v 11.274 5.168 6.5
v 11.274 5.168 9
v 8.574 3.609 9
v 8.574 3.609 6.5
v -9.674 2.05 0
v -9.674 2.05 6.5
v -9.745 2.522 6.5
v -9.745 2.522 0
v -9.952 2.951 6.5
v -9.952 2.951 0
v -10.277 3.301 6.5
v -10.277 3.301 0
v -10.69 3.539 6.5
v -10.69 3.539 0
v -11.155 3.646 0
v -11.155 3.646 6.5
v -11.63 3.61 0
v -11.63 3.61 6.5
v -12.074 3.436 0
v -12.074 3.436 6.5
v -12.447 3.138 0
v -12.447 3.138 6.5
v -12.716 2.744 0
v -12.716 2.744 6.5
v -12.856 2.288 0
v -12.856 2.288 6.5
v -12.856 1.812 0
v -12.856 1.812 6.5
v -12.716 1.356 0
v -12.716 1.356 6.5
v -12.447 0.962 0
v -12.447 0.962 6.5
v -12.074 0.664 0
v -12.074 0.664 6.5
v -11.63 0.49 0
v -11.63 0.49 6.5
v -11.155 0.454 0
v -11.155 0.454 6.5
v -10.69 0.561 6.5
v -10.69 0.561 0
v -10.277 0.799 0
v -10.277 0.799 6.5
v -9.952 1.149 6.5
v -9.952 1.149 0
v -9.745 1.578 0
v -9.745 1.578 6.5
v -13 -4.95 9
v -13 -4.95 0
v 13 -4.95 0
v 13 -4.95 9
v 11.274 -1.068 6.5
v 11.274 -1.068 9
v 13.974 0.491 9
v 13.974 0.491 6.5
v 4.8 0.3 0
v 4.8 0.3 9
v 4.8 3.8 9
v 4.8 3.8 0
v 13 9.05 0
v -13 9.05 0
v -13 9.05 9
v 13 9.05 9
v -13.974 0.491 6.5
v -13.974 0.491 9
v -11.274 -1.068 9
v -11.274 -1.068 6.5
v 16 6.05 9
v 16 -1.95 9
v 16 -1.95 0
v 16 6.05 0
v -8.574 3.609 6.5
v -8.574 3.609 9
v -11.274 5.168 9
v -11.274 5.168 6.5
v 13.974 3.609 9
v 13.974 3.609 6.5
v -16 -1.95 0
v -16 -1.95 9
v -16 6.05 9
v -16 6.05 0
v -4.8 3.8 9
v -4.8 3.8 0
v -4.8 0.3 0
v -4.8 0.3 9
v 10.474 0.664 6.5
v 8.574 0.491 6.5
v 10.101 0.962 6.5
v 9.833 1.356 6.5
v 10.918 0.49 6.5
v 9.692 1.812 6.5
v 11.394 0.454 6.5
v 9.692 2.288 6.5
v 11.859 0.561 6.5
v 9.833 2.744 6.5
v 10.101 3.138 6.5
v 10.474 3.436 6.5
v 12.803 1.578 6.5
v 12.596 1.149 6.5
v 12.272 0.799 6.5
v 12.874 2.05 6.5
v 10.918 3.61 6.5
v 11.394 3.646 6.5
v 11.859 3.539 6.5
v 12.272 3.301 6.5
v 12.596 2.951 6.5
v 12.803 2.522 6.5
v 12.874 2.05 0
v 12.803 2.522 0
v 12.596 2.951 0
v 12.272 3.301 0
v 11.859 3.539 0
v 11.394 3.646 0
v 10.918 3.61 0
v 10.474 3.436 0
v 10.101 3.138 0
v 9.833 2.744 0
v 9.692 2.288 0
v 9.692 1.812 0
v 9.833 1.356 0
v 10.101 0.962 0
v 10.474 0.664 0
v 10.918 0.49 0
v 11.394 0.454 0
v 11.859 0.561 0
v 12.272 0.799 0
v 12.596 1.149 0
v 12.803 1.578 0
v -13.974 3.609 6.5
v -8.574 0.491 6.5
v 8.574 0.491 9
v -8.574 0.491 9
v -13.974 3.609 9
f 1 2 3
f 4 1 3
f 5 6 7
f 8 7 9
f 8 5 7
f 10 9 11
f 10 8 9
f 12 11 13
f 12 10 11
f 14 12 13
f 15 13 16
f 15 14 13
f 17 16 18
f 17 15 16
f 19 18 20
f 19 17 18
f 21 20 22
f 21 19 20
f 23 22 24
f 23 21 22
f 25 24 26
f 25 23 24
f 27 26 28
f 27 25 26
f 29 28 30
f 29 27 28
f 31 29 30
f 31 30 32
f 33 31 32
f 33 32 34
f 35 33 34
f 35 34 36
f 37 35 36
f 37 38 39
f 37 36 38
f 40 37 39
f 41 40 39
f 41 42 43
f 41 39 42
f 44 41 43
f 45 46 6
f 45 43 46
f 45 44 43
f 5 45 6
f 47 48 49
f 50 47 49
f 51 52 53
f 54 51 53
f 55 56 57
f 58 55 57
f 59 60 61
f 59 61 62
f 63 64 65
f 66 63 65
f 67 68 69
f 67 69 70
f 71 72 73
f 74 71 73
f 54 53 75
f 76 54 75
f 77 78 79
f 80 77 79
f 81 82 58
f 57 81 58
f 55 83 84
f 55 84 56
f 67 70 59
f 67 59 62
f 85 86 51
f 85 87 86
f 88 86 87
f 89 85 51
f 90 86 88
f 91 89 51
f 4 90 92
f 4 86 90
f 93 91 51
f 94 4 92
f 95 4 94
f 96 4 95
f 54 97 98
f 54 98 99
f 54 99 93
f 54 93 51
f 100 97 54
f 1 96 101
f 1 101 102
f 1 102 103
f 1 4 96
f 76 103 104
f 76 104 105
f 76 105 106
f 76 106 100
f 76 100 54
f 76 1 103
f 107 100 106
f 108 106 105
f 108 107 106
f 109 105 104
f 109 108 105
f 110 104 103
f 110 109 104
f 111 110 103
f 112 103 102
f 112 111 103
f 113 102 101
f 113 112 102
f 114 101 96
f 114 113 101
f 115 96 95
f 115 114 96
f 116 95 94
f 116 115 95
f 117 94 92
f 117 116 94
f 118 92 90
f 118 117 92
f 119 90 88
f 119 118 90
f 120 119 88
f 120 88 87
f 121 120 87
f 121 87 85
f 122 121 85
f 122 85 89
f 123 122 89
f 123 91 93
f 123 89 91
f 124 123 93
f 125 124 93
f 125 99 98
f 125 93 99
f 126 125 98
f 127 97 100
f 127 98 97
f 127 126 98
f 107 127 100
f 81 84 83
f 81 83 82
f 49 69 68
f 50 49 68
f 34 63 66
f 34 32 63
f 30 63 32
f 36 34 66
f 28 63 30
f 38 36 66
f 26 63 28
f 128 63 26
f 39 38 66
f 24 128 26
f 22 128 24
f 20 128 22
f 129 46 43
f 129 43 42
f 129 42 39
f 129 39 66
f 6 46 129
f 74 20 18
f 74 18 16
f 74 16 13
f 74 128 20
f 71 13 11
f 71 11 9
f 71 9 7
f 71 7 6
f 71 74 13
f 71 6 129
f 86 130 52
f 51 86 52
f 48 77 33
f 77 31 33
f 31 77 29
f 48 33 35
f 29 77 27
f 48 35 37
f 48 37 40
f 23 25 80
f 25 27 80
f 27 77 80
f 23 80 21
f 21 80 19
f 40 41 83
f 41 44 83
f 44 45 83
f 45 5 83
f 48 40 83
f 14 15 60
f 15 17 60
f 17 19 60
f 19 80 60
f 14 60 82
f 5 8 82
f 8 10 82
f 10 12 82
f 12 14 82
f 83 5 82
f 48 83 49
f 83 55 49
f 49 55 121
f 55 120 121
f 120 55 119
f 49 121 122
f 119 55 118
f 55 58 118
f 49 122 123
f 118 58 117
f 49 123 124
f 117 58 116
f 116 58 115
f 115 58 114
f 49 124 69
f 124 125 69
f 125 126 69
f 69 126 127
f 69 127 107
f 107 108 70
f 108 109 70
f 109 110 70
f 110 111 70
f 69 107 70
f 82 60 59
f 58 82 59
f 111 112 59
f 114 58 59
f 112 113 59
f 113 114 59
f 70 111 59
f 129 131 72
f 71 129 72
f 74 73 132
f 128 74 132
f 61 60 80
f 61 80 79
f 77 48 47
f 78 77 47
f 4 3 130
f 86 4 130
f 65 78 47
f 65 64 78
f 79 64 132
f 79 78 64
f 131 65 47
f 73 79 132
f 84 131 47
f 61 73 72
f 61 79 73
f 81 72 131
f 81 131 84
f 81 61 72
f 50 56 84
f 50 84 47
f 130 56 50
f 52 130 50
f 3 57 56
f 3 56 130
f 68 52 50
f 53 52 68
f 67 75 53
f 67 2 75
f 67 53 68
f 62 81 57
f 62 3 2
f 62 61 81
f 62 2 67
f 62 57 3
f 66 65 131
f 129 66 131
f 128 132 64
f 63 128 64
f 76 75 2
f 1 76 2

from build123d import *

# Parameters (mm, degrees)
F0_W     = 32
F0_H     = 14
F0_R     = 1.6
F0_W_2   = 9.6
F0_H_2   = 3.5
F1_DEPTH = 9
F2_SIZE  = 3
F4_DEPTH = 2.5


with BuildPart() as f1:
    # F0 (on Top) → F1 (new body)
    with BuildSketch(Plane.XY):
        with Locations((0, 2.05)):
            Rectangle(F0_W, F0_H)
        with Locations((-11.274233, 2.05)):
            Circle(F0_R, mode=Mode.SUBTRACT)
        with Locations((0, 2.05)):
            Rectangle(F0_W_2, F0_H_2, mode=Mode.SUBTRACT)
        with Locations((11.274233, 2.05)):
            Circle(F0_R, mode=Mode.SUBTRACT)
    extrude(amount=F1_DEPTH)

    # F2
    f2_edges = [f1.edges().sort_by_distance(p)[0] for p in [
        (-16, -4.95, 4.5),
        (16, -4.95, 4.5),
        (16, 9.05, 4.5),
        (-16, 9.05, 4.5),
    ]]
    chamfer(f2_edges, length=F2_SIZE)

    # F3 (on face) → F4 (cut)
    with BuildSketch(Plane.XY.offset(9)):
        Polygon((-8.574233, 0.491154), (-8.574233, 3.608846), (-11.274233, 5.167691), (-13.974233, 3.608846), (-13.974233, 0.491154), (-11.274233, -1.067691), align=None)
        Polygon((13.974233, 0.491154), (13.974233, 3.608846), (11.274233, 5.167691), (8.574233, 3.608846), (8.574233, 0.491154), (11.274233, -1.067691), align=None)
    extrude(amount=-F4_DEPTH, mode=Mode.SUBTRACT)


solid = f1.part
